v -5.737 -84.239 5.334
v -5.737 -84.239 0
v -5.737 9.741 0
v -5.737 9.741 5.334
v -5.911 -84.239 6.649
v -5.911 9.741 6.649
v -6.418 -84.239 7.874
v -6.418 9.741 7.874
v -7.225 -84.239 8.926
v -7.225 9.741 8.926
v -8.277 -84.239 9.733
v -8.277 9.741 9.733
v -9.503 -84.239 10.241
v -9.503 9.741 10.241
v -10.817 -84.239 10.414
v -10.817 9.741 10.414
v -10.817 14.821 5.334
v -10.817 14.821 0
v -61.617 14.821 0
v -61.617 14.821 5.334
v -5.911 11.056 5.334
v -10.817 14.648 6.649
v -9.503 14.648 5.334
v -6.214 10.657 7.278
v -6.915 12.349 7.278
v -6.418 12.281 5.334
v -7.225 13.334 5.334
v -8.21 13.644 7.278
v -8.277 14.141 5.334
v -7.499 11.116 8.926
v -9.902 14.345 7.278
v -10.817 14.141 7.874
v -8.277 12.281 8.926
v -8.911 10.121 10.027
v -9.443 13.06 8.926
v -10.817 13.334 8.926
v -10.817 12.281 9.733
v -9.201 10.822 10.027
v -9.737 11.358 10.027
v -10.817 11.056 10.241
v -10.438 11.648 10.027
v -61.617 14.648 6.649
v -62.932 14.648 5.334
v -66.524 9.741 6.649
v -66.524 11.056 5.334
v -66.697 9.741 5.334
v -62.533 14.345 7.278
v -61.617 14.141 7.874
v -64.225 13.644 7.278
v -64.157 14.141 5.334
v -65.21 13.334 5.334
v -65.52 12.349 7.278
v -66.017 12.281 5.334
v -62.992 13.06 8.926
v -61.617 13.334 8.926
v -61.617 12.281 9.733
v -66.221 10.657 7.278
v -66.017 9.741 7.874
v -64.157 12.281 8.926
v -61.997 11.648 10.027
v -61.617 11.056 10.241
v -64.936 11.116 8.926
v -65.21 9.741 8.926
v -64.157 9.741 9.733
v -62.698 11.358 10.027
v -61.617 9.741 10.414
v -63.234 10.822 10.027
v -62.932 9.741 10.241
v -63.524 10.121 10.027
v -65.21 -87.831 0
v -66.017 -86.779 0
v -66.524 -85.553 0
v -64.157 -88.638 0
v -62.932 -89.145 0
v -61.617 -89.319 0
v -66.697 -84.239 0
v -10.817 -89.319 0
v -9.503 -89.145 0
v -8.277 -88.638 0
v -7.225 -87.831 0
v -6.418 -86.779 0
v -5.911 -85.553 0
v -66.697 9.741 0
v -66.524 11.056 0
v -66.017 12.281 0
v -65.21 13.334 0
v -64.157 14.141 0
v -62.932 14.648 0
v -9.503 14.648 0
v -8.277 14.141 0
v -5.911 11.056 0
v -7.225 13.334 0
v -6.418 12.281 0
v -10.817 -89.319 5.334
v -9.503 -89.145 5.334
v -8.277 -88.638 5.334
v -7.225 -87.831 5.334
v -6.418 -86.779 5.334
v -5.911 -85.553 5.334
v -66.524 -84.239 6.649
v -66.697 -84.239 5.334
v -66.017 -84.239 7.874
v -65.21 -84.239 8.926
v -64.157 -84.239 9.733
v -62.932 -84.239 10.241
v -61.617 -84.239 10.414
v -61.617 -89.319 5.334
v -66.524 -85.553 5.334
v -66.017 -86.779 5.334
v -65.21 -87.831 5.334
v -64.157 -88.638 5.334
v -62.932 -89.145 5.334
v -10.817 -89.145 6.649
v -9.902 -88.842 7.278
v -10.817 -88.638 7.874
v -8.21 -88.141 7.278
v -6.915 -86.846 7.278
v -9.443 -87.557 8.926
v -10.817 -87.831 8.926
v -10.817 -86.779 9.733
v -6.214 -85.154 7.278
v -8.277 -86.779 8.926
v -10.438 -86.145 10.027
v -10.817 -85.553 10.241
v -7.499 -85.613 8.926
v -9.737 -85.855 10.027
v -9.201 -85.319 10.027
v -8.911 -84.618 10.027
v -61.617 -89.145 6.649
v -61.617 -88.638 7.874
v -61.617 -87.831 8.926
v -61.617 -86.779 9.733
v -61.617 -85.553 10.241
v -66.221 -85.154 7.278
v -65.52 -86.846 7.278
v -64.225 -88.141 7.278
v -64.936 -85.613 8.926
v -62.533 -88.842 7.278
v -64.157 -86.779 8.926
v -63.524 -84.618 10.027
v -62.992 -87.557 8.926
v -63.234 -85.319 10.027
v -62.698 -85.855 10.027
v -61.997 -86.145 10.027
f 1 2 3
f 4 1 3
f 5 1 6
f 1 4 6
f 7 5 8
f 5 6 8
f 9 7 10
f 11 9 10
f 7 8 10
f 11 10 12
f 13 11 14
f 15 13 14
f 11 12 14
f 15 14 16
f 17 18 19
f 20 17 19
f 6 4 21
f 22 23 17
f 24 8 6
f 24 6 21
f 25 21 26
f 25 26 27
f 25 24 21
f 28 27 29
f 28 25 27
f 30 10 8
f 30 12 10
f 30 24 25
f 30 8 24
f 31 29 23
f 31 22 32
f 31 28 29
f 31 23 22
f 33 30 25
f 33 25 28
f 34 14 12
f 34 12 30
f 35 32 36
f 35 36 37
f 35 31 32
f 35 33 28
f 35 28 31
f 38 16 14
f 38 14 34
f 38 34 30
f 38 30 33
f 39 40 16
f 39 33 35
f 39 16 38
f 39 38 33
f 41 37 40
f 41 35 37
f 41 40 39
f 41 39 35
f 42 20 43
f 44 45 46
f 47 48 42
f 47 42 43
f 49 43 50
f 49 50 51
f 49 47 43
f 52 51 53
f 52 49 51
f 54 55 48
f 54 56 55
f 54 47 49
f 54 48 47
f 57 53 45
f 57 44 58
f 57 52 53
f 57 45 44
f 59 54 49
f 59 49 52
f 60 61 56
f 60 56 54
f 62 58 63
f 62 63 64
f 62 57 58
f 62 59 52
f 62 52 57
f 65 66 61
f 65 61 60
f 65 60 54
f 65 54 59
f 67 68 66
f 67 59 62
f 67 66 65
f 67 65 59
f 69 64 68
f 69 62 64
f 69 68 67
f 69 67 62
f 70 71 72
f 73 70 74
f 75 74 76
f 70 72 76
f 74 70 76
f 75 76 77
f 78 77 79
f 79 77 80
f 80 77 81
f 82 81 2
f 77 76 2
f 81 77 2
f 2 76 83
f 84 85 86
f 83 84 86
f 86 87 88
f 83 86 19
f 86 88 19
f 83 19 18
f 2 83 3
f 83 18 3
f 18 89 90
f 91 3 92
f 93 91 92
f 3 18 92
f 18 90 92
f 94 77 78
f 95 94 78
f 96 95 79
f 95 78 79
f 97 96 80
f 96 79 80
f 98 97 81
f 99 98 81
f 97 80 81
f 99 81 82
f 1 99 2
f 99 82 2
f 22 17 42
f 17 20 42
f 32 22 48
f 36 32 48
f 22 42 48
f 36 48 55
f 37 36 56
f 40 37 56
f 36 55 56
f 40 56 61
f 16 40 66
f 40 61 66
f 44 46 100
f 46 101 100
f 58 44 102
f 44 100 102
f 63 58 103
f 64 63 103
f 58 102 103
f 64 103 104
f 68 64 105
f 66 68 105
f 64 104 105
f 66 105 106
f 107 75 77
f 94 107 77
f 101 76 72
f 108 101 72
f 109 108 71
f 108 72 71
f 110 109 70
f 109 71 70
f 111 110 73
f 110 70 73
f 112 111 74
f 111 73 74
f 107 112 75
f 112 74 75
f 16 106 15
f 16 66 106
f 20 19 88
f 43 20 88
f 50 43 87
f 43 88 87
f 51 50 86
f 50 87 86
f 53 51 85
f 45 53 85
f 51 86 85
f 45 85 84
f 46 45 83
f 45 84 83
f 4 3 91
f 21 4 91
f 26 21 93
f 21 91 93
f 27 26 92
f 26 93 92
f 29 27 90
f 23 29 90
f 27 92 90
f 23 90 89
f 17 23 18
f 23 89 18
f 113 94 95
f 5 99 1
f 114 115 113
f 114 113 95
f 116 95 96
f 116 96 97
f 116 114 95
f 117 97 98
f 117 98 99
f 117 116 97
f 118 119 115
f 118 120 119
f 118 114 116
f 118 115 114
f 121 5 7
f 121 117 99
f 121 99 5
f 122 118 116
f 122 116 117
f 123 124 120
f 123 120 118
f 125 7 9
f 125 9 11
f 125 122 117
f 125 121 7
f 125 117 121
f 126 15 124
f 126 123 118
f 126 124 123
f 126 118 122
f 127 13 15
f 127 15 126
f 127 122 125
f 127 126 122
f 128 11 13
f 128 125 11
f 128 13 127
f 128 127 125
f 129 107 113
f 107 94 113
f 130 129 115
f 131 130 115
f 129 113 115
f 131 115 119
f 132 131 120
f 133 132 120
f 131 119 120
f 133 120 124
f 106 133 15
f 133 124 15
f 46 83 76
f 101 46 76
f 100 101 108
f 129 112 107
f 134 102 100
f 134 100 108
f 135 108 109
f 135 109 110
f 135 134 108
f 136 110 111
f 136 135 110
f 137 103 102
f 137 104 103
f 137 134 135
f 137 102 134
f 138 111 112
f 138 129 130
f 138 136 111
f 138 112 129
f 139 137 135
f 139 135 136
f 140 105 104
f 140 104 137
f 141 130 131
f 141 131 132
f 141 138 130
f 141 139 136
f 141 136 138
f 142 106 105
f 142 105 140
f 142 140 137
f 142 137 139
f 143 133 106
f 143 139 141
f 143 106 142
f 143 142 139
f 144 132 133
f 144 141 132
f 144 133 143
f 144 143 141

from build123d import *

# Parameters (mm, degrees)
F0_R     = 17.78
F0_W     = 50.8
F0_H     = 38.1
F0_R_2   = 7.62
F1_DEPTH = 10.414
F2_R     = 5.08


with BuildPart() as f1:
    # F0 (on Top) → F1 (new body)
    with BuildSketch(Plane.XY):
        with BuildLine():
            Line((-10.817469722, 14.821465837), (-61.617469722, 14.821465837))
            ThreePointArc((-61.617469722, 14.821465837), (-65.2095721705, 13.3335682854), (-66.697469722, 9.741465837))
            Line((-66.697469722, 9.741465837), (-66.697469722, -84.238534163))
            ThreePointArc((-66.697469722, -84.238534163), (-65.2095721705, -87.8306366114), (-61.617469722, -89.318534163))
            Line((-61.617469722, -89.318534163), (-10.817469722, -89.318534163))
            ThreePointArc((-10.817469722, -89.318534163), (-7.2253672736, -87.8306366114), (-5.737469722, -84.238534163))
            Line((-5.737469722, -84.238534163), (-5.737469722, 9.741465837))
            ThreePointArc((-5.737469722, 9.741465837), (-7.2253672736, 13.3335682854), (-10.817469722, 14.821465837))
        make_face()
        with Locations((-36.217469722, -58.838534163)):
            Circle(F0_R, mode=Mode.SUBTRACT)
        with Locations((-36.217469722, -10.578534163)):
            Rectangle(F0_W, F0_H, mode=Mode.SUBTRACT)
        with Locations((-36.217469722, -10.578534163)):
            Rectangle(F0_W, F0_H)
        with Locations((-36.217469722, -58.838534163)):
            Circle(F0_R)
        with Locations((-36.217469722, -58.838534163)):
            Circle(F0_R_2, mode=Mode.SUBTRACT)
        with Locations((-36.217469722, -58.838534163)):
            Circle(F0_R_2)
    extrude(amount=F1_DEPTH)

    # F2
    f2_edges = [f1.edges().sort_by_distance(p)[0] for p in [
        (-36.21747, -89.318534, 10.414),
        (-36.21747, 14.821466, 10.414),
    ]]
    fillet(f2_edges, radius=F2_R)


solid = f1.part
